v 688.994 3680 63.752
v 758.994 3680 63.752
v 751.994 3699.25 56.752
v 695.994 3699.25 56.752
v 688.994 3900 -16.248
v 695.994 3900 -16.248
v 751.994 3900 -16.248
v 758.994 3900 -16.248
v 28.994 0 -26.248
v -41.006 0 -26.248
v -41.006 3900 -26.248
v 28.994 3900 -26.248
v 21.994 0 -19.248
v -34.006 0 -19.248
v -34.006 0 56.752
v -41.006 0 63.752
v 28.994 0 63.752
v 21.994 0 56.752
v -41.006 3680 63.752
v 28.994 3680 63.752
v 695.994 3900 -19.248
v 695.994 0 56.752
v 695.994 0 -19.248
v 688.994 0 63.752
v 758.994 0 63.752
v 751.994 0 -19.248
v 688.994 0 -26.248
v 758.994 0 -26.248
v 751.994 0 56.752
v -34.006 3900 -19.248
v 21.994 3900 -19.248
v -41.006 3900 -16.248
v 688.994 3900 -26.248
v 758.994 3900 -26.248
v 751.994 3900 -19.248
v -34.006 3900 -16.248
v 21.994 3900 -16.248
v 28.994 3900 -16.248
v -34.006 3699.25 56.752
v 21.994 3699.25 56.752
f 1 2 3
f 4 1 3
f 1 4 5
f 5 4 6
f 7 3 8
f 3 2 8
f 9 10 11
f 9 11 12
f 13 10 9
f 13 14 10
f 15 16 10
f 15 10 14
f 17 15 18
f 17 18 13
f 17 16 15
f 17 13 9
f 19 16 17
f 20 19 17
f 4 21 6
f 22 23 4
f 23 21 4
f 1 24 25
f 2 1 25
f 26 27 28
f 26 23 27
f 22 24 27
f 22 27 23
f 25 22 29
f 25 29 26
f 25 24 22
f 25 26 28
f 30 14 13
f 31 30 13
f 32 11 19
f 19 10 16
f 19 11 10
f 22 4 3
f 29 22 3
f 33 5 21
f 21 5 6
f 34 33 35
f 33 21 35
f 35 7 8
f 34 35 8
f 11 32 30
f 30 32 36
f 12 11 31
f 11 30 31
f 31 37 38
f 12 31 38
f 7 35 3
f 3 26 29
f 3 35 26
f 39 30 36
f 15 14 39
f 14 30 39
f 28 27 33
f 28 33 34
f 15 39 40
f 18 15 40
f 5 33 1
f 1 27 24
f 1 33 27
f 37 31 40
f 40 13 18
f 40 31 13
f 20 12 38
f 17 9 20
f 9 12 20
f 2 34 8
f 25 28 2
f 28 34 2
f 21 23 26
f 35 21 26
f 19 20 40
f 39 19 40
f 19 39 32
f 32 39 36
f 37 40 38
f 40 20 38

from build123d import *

# Parameters (mm, degrees)
F0_W     = 70
F0_H     = 90
F0_W_2   = 56
F0_H_2   = 76
F1_DEPTH = 3900
F3_DEPTH = 800.001
F5_DEPTH = 70.001


with BuildPart() as f1:
    # F0 (on Front) → F1 (new body)
    with BuildSketch(Plane.XZ):
        with Locations((-6.005581, 18.751773)):
            Rectangle(F0_W, F0_H)
        with Locations((-6.005581, 18.751773)):
            Rectangle(F0_W_2, F0_H_2, mode=Mode.SUBTRACT)
        with Locations((723.994419, 18.751773)):
            Rectangle(F0_W, F0_H)
        with Locations((723.994419, 18.751773)):
            Rectangle(F0_W_2, F0_H_2, mode=Mode.SUBTRACT)
    extrude(amount=-F1_DEPTH)

    # F2 (on face) → F3 (cut, through all)
    with BuildSketch(Plane.YZ.offset(758.994419)):
        Polygon((3900, 63.751773), (3680, 63.751773), (3900, -16.248227), align=None)
    extrude(amount=-F3_DEPTH, mode=Mode.SUBTRACT)

    # F4 (on face) → F5 (cut, through all)
    with BuildSketch(Plane.YZ.offset(28.994419)):
        Polygon((3900, 63.751773), (3680, 63.751773), (3900, -16.248227), align=None)
    extrude(amount=-F5_DEPTH, mode=Mode.SUBTRACT)


solid = f1.part
